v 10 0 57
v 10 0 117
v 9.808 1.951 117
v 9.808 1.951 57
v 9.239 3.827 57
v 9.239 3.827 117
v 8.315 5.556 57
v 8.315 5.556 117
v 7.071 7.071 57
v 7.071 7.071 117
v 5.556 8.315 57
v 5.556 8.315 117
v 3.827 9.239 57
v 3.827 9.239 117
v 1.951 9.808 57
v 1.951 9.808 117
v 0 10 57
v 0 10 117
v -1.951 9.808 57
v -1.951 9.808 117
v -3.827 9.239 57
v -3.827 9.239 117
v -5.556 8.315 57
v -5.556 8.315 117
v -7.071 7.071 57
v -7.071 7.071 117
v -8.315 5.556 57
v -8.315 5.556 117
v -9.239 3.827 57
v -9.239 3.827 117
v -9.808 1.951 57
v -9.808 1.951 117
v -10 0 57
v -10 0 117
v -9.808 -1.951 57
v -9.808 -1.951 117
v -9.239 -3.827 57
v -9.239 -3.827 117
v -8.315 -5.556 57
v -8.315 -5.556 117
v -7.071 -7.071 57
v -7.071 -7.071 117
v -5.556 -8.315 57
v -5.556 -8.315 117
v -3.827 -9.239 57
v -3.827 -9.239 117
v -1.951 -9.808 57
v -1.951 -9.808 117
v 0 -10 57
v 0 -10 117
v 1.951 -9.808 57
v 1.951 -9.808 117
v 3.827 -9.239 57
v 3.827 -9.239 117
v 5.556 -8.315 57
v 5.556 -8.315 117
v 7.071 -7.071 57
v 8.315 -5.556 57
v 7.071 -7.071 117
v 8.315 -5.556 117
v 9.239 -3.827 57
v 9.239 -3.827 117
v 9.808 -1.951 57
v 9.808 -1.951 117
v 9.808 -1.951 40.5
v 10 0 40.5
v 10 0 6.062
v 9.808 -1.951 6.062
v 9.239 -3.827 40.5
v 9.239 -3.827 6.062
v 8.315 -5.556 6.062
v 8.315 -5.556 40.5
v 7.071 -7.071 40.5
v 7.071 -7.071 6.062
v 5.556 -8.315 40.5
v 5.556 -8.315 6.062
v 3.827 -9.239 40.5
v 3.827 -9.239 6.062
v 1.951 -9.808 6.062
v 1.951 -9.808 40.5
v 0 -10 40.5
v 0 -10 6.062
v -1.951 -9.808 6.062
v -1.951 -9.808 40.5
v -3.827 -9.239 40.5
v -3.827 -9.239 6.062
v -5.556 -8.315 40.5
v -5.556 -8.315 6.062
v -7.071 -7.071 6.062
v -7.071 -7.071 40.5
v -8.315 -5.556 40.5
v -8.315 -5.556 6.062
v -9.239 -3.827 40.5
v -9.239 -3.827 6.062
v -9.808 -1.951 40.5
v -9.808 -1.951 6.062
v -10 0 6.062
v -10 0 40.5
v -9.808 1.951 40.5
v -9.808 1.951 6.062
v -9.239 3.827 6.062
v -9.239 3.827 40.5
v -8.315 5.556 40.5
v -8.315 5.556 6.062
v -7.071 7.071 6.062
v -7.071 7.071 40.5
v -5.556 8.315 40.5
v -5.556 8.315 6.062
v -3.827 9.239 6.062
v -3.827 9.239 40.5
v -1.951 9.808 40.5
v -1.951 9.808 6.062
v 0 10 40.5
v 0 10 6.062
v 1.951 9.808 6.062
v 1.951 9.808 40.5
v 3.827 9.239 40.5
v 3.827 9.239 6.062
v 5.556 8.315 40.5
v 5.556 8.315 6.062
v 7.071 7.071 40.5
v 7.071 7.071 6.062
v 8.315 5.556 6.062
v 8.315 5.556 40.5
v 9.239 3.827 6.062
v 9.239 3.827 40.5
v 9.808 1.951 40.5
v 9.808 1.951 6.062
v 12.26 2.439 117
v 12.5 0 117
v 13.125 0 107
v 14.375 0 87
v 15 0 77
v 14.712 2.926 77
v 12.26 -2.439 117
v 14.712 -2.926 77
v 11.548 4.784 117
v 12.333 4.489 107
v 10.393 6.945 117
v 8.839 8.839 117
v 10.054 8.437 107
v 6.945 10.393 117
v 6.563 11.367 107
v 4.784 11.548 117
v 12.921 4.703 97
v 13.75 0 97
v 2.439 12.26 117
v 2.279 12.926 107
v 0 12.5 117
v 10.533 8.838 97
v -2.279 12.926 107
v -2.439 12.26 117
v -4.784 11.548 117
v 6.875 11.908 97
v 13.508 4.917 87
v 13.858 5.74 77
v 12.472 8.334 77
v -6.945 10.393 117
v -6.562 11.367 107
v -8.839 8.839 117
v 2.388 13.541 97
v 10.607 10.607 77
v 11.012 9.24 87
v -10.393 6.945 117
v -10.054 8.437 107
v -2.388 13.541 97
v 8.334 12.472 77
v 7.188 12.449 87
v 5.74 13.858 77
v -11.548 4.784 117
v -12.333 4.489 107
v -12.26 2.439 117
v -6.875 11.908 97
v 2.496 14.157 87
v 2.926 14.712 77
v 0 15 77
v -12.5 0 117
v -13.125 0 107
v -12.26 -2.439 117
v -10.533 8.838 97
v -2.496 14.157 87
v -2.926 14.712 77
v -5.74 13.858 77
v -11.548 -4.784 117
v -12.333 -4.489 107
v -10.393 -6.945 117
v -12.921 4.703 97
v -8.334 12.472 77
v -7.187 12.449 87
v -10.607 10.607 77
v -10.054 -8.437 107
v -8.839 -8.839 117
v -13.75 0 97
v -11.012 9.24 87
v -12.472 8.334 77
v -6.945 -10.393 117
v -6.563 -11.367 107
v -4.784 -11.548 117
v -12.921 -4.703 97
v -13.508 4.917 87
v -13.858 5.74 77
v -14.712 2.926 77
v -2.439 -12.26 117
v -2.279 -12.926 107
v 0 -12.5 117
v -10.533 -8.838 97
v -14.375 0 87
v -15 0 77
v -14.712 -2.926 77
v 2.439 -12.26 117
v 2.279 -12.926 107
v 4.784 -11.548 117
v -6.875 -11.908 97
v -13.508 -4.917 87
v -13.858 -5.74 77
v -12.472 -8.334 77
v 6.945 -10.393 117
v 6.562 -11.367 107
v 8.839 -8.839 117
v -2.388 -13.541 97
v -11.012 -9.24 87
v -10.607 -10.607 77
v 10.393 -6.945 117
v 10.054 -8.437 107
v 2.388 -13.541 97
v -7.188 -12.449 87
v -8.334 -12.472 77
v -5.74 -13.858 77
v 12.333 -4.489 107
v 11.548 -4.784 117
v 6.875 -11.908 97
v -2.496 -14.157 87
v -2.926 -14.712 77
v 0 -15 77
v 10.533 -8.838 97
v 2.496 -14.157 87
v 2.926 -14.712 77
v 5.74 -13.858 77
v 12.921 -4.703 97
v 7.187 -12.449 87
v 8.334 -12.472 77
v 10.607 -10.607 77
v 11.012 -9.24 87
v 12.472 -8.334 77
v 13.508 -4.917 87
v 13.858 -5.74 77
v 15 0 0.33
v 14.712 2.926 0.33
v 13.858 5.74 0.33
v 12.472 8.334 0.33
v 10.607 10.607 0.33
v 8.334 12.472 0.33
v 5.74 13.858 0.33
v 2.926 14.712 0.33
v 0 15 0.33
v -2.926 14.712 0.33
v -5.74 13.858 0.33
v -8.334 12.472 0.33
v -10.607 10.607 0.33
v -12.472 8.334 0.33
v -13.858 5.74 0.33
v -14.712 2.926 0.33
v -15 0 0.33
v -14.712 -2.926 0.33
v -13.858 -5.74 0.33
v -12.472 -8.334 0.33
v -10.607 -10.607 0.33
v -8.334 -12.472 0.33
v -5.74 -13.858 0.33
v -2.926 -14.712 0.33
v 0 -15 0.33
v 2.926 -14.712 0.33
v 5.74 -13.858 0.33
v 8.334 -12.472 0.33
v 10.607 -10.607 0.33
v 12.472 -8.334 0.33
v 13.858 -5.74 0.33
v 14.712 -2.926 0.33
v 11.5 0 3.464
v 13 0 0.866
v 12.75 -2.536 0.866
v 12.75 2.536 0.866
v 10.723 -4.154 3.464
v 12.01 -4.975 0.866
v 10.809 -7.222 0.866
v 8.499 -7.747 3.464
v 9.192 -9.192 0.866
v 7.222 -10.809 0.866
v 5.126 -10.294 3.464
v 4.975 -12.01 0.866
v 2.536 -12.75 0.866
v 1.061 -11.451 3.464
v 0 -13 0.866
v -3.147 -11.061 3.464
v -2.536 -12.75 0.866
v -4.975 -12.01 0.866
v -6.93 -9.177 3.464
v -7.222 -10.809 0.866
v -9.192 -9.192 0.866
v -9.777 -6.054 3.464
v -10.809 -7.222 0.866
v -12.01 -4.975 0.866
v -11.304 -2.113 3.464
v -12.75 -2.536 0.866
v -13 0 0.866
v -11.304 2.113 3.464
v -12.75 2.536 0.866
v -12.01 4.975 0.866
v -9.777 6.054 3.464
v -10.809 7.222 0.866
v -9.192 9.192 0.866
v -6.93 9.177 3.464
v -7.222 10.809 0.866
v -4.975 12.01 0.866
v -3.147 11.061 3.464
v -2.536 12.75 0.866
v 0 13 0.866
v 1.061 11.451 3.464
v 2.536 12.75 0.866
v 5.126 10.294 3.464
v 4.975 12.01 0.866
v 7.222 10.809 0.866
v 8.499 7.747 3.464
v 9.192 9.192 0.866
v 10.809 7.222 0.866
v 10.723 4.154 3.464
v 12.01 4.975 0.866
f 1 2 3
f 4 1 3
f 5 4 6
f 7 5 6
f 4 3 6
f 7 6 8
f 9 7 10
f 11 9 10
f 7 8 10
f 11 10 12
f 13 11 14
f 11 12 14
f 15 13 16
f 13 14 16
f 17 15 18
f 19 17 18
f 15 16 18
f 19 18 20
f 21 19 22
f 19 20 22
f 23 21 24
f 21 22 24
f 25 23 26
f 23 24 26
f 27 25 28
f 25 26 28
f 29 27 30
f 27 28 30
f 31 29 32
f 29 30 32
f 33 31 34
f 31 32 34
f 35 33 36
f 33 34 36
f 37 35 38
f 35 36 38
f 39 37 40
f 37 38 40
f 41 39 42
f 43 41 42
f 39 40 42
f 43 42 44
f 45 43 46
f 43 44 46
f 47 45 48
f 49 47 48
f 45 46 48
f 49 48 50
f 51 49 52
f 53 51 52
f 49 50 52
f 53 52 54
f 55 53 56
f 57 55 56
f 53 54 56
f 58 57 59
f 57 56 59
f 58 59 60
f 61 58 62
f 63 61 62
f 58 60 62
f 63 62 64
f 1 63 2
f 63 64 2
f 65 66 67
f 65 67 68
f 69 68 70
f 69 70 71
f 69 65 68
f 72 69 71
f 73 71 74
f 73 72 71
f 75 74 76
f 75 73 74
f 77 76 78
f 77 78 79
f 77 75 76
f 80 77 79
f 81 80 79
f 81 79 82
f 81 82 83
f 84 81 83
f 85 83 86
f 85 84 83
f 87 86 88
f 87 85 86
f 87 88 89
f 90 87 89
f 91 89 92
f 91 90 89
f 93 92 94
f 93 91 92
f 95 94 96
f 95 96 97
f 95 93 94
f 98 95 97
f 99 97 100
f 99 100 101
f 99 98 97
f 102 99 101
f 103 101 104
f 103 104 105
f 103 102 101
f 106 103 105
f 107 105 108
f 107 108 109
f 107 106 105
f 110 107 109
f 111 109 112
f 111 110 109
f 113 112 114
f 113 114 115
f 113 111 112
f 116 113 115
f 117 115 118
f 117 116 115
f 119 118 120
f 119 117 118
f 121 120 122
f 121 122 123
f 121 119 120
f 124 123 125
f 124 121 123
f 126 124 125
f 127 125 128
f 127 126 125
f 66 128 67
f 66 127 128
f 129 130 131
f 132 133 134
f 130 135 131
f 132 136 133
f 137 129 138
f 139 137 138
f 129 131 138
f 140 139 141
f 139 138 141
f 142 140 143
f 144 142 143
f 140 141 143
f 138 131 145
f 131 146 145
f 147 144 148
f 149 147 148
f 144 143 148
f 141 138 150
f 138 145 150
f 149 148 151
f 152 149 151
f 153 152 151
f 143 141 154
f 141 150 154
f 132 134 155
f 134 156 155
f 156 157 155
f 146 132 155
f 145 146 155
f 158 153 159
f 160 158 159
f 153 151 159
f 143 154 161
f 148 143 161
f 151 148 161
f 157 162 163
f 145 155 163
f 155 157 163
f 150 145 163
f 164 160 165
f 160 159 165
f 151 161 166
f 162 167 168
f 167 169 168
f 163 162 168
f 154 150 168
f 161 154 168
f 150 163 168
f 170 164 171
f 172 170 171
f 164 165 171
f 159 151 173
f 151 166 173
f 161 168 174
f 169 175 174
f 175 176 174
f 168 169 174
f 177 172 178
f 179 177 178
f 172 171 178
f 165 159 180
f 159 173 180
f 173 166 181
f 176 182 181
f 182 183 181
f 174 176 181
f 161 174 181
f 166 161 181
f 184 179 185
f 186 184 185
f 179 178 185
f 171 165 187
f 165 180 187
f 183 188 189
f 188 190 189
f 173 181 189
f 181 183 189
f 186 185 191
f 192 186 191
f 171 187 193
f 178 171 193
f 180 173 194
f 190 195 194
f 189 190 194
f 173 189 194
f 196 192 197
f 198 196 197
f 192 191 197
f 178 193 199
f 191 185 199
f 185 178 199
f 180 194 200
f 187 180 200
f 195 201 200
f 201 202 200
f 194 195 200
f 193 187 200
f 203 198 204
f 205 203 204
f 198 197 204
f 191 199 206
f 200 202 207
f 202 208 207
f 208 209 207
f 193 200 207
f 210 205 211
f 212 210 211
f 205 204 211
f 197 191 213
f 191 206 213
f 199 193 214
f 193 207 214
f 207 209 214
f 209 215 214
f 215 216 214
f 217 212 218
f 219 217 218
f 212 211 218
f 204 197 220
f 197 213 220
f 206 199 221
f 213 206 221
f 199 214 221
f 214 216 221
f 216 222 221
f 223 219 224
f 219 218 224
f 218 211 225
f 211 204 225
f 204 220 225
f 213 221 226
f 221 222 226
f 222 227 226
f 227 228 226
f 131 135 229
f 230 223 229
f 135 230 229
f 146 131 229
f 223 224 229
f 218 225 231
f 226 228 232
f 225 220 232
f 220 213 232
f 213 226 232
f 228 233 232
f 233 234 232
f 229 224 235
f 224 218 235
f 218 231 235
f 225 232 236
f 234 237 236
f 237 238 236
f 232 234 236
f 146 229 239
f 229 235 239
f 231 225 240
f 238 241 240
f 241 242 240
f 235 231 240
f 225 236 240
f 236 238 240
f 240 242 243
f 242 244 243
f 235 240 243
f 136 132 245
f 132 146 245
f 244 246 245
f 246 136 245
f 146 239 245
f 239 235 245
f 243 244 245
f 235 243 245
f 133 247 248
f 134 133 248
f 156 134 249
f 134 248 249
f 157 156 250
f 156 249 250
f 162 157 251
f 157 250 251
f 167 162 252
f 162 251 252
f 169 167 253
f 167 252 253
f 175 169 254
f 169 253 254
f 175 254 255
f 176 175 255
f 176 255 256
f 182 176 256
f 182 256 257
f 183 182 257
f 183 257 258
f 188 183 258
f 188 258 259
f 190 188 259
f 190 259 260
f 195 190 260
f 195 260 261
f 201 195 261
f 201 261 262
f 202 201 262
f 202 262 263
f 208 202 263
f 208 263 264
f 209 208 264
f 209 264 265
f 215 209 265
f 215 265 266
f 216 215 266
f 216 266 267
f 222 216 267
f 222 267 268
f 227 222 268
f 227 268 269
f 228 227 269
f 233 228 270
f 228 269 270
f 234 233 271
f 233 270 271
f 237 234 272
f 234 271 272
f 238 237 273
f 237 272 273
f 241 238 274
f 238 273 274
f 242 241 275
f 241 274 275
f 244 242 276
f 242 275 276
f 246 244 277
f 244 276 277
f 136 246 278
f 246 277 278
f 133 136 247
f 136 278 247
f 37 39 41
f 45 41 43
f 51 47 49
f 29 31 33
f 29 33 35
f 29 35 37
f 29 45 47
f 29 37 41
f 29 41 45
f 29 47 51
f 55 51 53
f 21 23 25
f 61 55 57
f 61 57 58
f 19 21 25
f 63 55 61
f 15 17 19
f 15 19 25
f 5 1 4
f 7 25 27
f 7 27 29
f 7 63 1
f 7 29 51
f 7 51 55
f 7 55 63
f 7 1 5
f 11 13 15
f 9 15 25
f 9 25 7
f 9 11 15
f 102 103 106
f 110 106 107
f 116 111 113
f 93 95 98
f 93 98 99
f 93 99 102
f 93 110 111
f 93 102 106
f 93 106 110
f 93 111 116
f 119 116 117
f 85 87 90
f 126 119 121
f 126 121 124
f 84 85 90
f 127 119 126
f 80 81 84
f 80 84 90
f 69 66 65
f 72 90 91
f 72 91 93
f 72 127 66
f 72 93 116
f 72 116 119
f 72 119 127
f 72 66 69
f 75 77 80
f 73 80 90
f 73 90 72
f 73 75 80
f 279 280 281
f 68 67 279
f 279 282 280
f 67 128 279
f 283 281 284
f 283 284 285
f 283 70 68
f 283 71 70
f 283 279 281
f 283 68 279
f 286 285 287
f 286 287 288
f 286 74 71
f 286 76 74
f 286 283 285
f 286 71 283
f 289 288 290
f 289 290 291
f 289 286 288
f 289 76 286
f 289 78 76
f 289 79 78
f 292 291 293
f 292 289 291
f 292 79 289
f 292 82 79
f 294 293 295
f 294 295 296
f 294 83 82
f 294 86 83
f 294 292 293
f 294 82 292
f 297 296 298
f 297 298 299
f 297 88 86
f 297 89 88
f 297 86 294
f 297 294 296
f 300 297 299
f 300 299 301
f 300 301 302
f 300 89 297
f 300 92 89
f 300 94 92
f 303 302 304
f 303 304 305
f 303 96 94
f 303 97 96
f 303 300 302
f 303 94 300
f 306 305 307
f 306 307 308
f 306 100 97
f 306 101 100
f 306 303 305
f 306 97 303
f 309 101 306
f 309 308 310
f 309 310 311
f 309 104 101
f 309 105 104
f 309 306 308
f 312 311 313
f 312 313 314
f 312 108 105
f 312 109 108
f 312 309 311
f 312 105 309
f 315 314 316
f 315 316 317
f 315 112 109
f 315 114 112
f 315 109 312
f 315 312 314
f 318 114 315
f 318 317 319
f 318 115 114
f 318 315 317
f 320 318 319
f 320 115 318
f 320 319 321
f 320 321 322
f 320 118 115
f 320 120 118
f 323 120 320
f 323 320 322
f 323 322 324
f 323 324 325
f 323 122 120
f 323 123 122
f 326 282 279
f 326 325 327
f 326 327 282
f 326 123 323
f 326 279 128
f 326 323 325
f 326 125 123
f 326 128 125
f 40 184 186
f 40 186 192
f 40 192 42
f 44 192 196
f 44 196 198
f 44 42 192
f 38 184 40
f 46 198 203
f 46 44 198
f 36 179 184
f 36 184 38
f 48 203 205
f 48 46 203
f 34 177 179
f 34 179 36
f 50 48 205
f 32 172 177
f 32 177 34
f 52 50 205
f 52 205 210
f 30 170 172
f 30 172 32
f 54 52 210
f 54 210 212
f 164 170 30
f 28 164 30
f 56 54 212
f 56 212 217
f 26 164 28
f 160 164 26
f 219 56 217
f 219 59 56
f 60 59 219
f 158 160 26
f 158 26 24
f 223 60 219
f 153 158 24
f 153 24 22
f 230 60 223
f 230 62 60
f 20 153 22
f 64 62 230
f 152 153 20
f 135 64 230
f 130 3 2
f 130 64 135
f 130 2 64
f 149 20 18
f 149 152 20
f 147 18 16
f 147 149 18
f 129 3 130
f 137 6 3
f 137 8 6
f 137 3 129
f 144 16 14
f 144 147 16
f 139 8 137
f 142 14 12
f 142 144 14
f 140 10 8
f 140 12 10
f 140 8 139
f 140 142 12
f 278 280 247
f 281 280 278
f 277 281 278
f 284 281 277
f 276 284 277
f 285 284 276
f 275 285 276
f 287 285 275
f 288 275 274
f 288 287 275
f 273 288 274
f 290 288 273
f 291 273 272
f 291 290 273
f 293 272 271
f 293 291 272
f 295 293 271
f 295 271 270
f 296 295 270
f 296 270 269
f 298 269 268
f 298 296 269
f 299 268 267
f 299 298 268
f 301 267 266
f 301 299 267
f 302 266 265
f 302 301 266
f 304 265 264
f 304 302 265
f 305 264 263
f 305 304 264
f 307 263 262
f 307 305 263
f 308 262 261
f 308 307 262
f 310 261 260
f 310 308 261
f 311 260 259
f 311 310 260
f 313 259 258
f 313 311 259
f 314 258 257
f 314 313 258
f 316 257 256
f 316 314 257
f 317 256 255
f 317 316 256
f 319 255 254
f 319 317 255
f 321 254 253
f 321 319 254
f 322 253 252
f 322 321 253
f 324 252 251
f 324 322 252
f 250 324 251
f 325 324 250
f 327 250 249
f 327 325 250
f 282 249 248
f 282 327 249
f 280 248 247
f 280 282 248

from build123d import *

# Parameters (mm, degrees)
SKETCH_1_R          = 15
EXTRUDE_1_DEPTH     = 77
SKETCH_3_R          = 12.5
SKETCH_2_R          = 15
SKETCH_5_R          = 10
CUT_EXTRUDE_1_DEPTH = 60
CUT_EXTRUDE_START   = -40.5
SKETCH_6_R          = 10
CUT_EXTRUDE_2_DEPTH = 40.5
CHAMFER_1_SIZE      = 3.5
CHAMFER_1_SIZE2     = 6.062177826
CHAMFER_2_SIZE      = 2.732050808
CHAMFER_2_SIZE_2    = 1


with BuildPart() as part:
    # 스케치1 → 보스-돌출1 (new body)
    with BuildSketch(Plane.XY):
        Circle(SKETCH_1_R)
    extrude(amount=EXTRUDE_1_DEPTH)

    # 스케치3 → 로프트1 section 0
    with BuildSketch(Plane.XY.offset(117)):
        Circle(SKETCH_3_R)
    # 스케치2 → 로프트1 section 1
    with BuildSketch(Plane.XY.offset(77)):
        Circle(SKETCH_2_R)
    loft()

    # 스케치5 → 컷-돌출1 (cut)
    with BuildSketch(Plane.XY.offset(117)):
        Circle(SKETCH_5_R)
    extrude(amount=-CUT_EXTRUDE_1_DEPTH, mode=Mode.SUBTRACT)

    # 스케치6 → 컷-돌출2 (cut)
    with BuildSketch(Plane(origin=(0, 0, 0), x_dir=(-1, 0, 0), z_dir=(0, 0, -1)).offset(CUT_EXTRUDE_START)):
        with Locations(Location((0, 0, 0), (0, 0, 180))):
            Circle(SKETCH_6_R)
    extrude(amount=CUT_EXTRUDE_2_DEPTH, mode=Mode.SUBTRACT)

    # 모따기1
    chamfer_1_edges = [part.edges().sort_by_distance(p)[0] for p in [
        (-10, 0, 0),
    ]]
    chamfer_1_side = [part.faces().sort_by_distance(p)[0] for p in [
        (-14.575735931, 0, 0),
    ]]
    chamfer(chamfer_1_edges, length=CHAMFER_1_SIZE, length2=CHAMFER_1_SIZE2, reference=chamfer_1_side[0])

    # 모따기2
    # the kernel refuses this chamfer: 2.732050808, 1 mm, written as the material it takes off along each edge
    with BuildSketch(Plane(origin=(0, 0, 0), x_dir=(1, 0, 0), z_dir=(0, 1, 0))) as chamfer_2_piece_1:
        Polygon((13.5 + CHAMFER_2_SIZE, 0), (13.5 - CHAMFER_2_SIZE_2 * 0.5, -CHAMFER_2_SIZE_2 * 0.866025403784), (13.5, 0), align=None)
    revolve(axis=Axis((0, 0, 0), (0, 0, -1)), mode=Mode.SUBTRACT)


solid = part.part
